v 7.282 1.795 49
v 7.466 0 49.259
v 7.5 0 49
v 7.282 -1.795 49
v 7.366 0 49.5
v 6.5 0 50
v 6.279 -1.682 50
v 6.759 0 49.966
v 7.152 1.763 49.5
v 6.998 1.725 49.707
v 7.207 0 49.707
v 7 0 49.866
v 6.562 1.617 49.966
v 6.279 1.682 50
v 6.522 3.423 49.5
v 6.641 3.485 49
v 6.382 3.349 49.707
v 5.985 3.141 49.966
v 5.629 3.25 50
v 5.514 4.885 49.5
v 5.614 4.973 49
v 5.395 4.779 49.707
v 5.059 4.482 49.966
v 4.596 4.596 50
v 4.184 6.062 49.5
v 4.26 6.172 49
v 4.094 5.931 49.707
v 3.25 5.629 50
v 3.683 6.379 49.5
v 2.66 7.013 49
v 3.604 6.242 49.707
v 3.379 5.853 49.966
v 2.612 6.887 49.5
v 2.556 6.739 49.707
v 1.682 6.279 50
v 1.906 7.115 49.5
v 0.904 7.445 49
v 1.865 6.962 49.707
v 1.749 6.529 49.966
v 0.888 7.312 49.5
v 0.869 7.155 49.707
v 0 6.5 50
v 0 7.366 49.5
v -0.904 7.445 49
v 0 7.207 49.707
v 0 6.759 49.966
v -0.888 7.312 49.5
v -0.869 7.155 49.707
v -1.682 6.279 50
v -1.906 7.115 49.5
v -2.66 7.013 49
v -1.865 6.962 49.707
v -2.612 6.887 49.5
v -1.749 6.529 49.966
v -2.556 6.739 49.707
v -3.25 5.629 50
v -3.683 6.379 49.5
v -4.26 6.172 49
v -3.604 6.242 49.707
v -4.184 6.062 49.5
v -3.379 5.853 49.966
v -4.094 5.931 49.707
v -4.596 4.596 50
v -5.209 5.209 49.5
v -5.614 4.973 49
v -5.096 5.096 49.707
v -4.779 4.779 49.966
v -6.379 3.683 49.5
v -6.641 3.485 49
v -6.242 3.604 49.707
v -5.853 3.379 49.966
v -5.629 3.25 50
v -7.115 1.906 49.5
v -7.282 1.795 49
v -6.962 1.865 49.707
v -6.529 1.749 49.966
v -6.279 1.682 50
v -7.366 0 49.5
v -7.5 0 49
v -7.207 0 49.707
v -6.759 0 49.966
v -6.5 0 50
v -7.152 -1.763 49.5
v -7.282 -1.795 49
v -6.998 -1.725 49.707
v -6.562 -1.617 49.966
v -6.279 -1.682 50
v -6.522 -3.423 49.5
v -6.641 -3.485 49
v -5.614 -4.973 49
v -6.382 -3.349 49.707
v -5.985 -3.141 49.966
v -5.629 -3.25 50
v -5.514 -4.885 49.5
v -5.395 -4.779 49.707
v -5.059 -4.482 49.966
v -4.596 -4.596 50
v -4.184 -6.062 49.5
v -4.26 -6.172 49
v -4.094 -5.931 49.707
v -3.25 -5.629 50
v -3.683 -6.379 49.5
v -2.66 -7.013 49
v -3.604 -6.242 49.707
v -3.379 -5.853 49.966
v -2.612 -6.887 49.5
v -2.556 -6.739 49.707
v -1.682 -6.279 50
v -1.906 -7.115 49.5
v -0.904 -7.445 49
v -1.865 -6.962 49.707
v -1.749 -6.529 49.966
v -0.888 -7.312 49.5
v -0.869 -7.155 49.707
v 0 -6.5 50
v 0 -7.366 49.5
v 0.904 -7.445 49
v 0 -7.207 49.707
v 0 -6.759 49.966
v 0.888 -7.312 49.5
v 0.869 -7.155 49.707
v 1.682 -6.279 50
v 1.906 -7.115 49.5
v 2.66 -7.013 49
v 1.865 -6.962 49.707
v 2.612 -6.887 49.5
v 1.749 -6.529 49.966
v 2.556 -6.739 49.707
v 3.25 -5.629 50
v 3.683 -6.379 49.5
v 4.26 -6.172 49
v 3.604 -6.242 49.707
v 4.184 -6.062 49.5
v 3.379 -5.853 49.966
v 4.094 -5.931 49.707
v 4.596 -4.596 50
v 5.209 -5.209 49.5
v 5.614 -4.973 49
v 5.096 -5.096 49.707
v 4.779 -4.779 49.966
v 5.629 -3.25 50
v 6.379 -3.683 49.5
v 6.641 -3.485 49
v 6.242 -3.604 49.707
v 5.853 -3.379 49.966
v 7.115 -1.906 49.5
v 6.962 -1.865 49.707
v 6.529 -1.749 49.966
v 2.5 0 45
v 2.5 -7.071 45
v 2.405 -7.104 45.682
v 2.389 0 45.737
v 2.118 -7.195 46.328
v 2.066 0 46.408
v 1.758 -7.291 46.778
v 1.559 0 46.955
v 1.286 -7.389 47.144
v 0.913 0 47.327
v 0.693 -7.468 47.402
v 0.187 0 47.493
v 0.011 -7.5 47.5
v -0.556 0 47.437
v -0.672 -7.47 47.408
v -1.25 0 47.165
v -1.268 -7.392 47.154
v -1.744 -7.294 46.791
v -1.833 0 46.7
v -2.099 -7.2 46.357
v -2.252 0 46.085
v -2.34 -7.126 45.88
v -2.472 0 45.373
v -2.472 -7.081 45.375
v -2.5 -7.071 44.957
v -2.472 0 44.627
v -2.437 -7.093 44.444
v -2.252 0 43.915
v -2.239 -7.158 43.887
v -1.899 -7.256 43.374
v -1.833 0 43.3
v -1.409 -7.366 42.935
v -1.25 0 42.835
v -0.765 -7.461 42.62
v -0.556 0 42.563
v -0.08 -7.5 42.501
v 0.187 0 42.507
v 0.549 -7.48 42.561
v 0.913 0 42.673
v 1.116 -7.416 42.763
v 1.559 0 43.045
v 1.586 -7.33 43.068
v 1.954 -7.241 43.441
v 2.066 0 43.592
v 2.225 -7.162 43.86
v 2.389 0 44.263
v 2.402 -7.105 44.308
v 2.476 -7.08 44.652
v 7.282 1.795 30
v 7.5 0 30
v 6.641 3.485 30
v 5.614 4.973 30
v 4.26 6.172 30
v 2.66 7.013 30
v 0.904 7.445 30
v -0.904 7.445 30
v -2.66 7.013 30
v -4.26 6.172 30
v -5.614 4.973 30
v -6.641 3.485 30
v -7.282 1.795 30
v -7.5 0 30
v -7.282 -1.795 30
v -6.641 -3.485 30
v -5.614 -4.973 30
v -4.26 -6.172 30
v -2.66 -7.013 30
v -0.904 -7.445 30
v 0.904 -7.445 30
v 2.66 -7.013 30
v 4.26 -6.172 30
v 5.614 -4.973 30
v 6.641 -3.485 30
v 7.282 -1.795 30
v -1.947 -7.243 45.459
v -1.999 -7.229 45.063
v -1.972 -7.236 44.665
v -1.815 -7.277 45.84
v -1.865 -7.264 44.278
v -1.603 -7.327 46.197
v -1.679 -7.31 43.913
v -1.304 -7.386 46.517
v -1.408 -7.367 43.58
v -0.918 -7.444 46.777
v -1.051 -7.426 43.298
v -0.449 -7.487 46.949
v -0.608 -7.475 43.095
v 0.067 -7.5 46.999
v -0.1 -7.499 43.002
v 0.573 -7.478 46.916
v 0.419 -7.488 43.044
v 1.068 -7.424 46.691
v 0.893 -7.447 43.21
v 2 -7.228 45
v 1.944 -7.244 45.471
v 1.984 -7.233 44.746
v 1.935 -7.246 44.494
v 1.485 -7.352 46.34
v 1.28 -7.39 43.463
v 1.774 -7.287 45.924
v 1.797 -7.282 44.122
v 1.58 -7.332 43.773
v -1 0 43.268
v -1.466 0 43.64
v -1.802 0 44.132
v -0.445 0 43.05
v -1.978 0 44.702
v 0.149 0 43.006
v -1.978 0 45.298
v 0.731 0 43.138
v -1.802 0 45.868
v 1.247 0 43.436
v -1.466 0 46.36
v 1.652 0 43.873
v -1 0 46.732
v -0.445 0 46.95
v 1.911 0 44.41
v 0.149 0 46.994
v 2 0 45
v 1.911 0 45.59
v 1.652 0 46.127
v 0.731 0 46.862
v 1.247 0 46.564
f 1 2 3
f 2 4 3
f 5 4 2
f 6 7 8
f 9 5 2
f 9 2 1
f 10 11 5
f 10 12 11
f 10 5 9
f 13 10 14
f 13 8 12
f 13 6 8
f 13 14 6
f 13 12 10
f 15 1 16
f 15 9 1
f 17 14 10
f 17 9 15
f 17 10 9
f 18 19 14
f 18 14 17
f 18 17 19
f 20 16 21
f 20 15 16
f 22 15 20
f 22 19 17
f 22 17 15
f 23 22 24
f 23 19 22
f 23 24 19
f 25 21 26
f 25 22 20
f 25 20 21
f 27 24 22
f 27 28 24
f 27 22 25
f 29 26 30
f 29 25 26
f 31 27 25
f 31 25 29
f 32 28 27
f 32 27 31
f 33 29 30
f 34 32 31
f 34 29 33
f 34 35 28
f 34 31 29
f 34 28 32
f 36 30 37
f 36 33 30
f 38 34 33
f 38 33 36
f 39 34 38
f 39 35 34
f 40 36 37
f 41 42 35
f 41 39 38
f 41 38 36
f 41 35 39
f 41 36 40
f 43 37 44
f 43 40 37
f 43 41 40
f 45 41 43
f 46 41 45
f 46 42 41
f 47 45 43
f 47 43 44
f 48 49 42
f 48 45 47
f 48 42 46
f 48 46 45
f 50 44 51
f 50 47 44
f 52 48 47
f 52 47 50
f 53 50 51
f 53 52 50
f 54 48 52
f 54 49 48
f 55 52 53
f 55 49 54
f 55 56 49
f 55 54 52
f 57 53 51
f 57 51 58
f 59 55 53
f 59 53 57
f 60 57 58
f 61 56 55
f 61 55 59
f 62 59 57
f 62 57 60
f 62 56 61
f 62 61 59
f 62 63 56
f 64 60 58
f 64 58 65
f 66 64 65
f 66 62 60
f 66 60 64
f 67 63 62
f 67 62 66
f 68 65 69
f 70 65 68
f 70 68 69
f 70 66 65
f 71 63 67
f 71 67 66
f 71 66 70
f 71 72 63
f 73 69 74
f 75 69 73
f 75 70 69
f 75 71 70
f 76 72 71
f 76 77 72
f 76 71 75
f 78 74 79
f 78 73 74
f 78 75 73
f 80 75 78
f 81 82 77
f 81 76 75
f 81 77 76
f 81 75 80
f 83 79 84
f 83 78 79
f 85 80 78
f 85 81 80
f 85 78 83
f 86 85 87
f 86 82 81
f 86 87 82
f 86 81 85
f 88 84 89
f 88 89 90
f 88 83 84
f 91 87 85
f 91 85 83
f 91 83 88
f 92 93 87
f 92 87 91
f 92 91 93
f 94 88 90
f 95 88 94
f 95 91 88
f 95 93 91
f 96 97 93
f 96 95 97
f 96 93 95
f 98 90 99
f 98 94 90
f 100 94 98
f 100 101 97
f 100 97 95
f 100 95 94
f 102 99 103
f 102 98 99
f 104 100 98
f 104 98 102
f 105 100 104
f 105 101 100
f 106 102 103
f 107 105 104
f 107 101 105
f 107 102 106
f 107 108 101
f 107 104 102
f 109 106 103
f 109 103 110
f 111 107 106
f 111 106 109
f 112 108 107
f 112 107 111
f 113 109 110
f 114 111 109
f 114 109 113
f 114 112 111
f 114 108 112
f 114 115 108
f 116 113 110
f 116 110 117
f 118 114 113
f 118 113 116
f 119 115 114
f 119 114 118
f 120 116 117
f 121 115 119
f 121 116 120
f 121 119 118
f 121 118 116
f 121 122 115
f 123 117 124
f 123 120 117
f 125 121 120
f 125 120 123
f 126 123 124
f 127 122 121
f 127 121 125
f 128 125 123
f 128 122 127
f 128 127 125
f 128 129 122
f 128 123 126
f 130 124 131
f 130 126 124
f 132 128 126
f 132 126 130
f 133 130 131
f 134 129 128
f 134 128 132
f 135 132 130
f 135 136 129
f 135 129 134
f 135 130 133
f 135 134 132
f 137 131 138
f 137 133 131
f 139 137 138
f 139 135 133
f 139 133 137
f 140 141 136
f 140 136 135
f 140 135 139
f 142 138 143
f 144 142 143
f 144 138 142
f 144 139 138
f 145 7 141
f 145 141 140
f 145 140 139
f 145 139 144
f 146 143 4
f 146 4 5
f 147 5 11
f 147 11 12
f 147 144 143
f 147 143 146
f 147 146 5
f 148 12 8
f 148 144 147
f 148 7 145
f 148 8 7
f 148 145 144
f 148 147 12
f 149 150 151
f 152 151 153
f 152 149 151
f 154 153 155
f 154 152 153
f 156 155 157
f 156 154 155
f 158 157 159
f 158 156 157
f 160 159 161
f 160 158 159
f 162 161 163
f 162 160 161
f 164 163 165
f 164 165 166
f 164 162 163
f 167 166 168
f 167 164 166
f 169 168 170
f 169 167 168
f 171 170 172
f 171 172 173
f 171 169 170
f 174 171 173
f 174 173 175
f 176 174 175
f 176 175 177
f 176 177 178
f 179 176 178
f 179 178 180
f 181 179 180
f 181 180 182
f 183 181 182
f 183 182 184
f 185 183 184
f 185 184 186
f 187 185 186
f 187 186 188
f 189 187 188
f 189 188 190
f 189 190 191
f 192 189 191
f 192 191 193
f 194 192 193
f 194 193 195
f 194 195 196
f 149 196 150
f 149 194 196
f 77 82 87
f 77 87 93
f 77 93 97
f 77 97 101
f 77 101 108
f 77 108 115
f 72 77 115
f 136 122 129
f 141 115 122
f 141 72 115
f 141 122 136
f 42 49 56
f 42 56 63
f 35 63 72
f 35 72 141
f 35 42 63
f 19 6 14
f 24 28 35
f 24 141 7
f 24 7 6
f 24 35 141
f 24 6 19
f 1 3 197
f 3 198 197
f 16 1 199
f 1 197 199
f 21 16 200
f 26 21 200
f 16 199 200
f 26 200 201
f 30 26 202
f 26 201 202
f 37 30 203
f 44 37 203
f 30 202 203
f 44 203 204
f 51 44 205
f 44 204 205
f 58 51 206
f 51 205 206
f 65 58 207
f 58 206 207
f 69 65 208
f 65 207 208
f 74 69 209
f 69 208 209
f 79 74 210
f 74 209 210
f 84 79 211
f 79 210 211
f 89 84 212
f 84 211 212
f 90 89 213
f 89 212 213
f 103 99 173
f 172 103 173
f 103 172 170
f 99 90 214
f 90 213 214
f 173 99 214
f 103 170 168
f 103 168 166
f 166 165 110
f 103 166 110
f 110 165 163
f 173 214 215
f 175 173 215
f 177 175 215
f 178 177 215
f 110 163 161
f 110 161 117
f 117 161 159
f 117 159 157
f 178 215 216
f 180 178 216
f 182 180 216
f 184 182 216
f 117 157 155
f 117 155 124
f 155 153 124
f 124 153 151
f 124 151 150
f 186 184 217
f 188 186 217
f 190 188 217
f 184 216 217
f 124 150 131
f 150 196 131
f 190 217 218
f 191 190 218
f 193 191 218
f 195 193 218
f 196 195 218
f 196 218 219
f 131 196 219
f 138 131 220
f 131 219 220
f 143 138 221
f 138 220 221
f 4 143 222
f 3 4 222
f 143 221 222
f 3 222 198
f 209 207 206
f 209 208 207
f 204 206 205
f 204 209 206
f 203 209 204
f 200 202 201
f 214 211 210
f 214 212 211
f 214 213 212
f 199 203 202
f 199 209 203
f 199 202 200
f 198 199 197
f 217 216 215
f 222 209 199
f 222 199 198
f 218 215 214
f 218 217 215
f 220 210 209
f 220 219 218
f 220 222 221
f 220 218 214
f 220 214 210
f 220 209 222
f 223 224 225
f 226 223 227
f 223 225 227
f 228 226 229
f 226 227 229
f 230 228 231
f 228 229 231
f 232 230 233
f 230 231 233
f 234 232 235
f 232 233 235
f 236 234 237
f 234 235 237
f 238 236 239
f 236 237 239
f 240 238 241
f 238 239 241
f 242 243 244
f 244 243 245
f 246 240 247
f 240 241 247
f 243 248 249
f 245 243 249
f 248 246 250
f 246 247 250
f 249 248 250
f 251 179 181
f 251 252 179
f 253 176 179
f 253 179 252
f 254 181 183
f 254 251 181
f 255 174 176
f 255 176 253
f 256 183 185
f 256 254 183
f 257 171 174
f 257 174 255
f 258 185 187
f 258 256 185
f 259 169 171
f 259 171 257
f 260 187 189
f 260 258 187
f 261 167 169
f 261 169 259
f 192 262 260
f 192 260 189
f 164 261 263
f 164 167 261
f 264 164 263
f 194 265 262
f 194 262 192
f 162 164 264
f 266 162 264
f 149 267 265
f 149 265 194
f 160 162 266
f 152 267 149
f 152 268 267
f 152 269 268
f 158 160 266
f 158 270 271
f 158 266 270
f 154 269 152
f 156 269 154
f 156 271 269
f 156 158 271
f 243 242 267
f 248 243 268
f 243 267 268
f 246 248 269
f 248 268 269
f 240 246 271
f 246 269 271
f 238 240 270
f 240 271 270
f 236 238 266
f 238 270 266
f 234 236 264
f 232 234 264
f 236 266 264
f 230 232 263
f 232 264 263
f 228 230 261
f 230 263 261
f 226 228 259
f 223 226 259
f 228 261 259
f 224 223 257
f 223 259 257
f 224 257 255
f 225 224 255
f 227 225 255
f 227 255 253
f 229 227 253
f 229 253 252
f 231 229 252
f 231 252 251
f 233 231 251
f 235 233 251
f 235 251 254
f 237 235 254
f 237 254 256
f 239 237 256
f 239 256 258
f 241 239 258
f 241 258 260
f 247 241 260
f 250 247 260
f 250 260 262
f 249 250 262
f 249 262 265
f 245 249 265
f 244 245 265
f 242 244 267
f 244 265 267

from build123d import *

# Parameters (mm, degrees)
F0_R      = 12.5
F1_DEPTH  = 20
F2_R      = 9
F3_DEPTH  = 10
F4_R      = 7.5
F5_DEPTH  = 20
F6_R      = 2
F7_SIZE   = 1
F8_R      = 1
F9_R      = 2.5
F9_R_2    = 2
F10_DEPTH = 25
F11_R     = 3.5
F11_R_2   = 2.5
F12_DEPTH = 50
F13_R     = 34.8132917853
F13_R_2   = 3.5
F13_R_3   = 2.5
F14_DEPTH = 80


with BuildPart() as f1:
    # F0 (on Top) → F1 (new body)
    with BuildSketch(Plane.XY):
        Circle(F0_R)
    extrude(amount=F1_DEPTH)

    # F2 (on face) → F3 (join)
    with BuildSketch(Plane.XY.offset(20)):
        Circle(F2_R)
    extrude(amount=F3_DEPTH)

    # F4 (on face) → F5 (join)
    with BuildSketch(Plane.XY.offset(30)):
        Circle(F4_R)
    extrude(amount=F5_DEPTH)

    # F6
    f6_edges = [f1.edges().sort_by_distance(p)[0] for p in [
        (-12.5, 0, 20),
    ]]
    fillet(f6_edges, radius=F6_R)

    # F7
    f7_edges = [f1.edges().sort_by_distance(p)[0] for p in [
        (-9, 0, 30),
    ]]
    chamfer(f7_edges, length=F7_SIZE)

    # F8
    f8_edges = [f1.edges().sort_by_distance(p)[0] for p in [
        (-7.5, 0, 50),
    ]]
    fillet(f8_edges, radius=F8_R)

    # F9 (on Front) → F10 (cut)
    with BuildSketch(Plane.XZ):
        with Locations((0, 45)):
            Circle(F9_R)
        with Locations((0, 45)):
            Circle(F9_R_2, mode=Mode.SUBTRACT)
    extrude(amount=F10_DEPTH, mode=Mode.SUBTRACT)

    # F11 (on face) → F12 (join)
    with BuildSketch(Plane(origin=(0, 0, 0), x_dir=(1, 0, 0), z_dir=(0, 0, -1))):
        Circle(F11_R)
        Circle(F11_R_2, mode=Mode.SUBTRACT)
    extrude(amount=F12_DEPTH)

    # F13 (on face) → F14 (cut, through all)
    with BuildSketch(Plane(origin=(0, 0, -50), x_dir=(1, 0, 0), z_dir=(0, 0, -1))):
        Circle(F13_R)
        Circle(F13_R_2, mode=Mode.SUBTRACT)
        Circle(F13_R_2)
        Circle(F13_R_3, mode=Mode.SUBTRACT)
        Circle(F13_R_3)
    extrude(amount=-F14_DEPTH, mode=Mode.SUBTRACT)


solid = f1.part
